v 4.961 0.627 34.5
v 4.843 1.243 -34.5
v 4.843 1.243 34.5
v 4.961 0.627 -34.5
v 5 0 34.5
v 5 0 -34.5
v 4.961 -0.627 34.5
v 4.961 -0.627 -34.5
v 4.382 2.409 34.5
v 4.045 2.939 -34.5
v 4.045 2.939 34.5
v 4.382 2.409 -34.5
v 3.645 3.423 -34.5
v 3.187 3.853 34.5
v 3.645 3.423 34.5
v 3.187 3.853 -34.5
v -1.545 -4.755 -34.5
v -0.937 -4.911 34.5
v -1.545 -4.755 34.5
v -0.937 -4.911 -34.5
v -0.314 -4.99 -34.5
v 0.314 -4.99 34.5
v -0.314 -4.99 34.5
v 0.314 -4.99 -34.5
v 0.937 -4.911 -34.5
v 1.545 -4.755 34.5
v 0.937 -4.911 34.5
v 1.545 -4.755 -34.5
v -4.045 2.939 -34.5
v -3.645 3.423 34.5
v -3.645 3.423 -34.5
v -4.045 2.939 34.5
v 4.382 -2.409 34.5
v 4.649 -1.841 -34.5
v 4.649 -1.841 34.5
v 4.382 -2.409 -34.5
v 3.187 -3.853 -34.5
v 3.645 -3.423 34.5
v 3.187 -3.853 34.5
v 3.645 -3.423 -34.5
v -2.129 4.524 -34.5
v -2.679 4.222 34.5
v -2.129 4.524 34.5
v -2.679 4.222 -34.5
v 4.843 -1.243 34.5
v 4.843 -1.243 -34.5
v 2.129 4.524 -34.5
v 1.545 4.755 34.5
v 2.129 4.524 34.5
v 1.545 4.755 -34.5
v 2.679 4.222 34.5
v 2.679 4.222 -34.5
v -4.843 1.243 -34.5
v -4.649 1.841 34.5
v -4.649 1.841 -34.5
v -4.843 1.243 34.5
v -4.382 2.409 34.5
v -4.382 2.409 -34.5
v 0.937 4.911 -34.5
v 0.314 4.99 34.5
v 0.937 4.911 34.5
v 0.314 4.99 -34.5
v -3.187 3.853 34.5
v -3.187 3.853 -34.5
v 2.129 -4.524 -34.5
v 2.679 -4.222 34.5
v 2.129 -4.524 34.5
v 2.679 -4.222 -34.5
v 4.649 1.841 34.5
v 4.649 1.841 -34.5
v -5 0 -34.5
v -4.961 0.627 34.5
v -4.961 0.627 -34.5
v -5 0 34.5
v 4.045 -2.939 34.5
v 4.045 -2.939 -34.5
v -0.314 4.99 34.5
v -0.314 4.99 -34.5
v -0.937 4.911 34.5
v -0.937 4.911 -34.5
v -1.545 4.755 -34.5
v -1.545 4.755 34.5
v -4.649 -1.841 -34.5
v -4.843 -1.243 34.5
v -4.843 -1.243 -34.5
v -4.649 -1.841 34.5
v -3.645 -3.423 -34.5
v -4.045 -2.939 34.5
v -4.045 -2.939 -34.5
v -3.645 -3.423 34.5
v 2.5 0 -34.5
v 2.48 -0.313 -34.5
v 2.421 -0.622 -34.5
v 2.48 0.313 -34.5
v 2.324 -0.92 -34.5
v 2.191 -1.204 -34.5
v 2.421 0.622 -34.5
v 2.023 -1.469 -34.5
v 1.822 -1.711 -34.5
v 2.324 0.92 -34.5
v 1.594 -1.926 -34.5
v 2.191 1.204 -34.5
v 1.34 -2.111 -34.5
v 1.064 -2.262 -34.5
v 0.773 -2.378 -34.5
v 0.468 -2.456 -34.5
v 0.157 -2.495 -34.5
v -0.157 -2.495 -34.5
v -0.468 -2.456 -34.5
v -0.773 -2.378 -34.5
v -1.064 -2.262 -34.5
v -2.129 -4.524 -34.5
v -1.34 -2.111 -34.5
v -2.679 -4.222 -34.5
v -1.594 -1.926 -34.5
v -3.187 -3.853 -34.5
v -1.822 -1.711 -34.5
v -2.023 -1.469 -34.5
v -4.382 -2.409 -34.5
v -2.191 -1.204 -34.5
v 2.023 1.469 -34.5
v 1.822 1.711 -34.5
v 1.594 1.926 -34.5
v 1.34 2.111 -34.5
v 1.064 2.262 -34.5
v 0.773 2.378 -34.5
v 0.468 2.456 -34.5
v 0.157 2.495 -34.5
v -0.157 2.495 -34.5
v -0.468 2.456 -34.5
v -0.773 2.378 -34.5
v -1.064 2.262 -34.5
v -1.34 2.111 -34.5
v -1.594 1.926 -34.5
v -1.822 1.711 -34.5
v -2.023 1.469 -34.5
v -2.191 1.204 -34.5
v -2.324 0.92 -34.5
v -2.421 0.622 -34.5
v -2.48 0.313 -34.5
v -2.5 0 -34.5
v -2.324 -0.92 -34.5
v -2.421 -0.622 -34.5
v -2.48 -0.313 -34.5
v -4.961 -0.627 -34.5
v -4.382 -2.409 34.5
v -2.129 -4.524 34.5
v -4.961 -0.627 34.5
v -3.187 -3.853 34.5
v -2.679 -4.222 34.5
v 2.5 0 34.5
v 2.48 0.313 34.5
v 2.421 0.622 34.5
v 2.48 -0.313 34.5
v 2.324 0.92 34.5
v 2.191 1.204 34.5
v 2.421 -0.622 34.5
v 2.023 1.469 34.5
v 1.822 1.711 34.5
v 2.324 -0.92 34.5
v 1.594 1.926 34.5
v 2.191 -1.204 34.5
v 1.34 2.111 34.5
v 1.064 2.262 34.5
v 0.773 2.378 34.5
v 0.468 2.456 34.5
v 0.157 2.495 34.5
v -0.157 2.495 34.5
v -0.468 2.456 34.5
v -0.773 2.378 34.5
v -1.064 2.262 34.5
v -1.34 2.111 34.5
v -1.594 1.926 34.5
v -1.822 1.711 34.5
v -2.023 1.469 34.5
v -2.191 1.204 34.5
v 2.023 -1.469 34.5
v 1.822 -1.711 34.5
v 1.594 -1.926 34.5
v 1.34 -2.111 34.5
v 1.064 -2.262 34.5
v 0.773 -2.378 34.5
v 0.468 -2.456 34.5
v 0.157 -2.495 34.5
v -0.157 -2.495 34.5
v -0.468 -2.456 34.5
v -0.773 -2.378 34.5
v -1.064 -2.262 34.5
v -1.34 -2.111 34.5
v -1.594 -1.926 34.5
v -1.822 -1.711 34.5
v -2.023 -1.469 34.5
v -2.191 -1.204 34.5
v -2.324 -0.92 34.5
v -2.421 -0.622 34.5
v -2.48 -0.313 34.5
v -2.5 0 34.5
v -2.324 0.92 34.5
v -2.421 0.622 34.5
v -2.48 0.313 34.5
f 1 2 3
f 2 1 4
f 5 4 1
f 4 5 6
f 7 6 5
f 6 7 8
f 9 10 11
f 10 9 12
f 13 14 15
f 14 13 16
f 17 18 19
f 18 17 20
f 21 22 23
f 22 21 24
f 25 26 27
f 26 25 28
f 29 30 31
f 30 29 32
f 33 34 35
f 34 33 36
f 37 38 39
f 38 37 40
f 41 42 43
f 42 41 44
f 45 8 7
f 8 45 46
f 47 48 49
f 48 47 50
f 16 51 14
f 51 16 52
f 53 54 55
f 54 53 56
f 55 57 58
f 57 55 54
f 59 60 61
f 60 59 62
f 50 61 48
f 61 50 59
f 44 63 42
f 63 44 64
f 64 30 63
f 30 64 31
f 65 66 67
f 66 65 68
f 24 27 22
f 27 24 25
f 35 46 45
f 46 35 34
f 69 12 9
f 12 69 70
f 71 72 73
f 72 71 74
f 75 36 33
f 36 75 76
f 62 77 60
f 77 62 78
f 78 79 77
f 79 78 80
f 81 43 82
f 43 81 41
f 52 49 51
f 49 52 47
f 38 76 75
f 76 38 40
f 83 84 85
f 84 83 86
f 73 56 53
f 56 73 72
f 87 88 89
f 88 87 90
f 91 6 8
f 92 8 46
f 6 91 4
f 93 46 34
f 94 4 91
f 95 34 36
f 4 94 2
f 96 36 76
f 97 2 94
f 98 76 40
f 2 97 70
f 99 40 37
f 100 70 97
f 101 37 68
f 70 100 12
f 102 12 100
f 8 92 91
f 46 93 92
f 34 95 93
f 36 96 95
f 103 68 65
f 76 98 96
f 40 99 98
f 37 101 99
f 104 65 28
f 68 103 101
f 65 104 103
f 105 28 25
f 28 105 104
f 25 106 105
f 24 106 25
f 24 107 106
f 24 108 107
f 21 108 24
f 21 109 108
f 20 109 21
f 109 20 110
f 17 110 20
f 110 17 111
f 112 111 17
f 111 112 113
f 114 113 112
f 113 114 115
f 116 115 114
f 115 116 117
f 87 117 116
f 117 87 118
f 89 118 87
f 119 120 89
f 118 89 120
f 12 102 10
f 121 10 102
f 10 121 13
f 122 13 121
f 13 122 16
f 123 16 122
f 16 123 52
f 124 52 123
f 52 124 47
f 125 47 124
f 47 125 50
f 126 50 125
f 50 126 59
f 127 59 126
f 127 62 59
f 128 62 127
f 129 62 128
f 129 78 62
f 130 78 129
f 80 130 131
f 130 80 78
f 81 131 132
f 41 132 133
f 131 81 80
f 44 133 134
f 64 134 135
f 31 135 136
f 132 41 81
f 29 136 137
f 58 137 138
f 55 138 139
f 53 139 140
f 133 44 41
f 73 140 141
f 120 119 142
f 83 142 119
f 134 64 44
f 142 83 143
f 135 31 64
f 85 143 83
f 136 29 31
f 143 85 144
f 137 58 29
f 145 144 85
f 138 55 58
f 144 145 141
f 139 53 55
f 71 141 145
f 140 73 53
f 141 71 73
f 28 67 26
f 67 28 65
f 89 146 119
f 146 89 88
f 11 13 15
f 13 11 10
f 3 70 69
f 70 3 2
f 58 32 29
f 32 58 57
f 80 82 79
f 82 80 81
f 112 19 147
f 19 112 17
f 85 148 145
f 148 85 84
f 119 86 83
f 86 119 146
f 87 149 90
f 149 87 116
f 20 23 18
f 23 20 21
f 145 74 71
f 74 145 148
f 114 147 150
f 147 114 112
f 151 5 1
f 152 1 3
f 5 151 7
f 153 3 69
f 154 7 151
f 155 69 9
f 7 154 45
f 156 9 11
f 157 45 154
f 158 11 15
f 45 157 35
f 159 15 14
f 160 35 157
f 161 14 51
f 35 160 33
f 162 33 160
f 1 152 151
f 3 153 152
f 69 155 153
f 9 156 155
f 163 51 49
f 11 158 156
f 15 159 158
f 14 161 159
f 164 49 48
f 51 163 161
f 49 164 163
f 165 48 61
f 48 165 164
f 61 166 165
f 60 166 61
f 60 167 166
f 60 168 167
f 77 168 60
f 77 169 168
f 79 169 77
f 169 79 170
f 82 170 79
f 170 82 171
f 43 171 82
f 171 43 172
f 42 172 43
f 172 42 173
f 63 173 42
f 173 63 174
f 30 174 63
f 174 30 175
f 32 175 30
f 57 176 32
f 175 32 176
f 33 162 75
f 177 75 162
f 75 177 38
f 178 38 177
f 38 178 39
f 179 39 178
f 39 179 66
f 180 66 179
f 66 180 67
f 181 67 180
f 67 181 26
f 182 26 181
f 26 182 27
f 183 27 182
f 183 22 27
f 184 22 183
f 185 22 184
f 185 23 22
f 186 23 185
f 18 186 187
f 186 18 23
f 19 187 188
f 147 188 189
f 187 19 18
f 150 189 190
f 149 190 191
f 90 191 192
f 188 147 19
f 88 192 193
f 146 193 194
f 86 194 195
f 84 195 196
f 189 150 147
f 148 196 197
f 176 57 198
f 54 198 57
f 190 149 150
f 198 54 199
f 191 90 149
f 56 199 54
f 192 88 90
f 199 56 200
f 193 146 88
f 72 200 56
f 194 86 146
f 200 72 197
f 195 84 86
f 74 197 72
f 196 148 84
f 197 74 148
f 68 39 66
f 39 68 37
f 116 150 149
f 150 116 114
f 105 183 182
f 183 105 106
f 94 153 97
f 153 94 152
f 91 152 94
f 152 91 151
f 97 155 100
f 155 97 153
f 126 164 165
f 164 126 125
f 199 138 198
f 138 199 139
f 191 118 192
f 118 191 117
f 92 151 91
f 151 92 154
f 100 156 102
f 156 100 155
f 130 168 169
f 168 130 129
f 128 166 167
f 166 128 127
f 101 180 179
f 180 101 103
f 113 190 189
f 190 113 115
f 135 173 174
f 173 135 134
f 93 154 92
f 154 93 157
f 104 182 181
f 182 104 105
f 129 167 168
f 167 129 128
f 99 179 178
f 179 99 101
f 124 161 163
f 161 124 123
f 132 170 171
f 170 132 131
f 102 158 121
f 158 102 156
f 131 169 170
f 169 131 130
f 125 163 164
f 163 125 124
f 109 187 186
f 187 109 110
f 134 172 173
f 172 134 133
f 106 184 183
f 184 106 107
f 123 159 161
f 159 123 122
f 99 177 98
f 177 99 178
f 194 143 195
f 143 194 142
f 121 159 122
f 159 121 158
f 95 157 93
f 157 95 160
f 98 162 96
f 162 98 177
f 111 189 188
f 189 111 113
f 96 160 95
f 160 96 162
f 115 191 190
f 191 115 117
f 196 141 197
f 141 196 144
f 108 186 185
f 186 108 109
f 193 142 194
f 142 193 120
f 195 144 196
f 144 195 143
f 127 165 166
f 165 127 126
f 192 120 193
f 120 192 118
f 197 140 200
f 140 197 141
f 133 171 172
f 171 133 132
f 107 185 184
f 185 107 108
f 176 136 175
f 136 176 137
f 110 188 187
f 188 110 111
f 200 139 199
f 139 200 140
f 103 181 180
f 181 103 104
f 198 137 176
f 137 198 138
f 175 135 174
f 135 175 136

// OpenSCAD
$fn = 50;


difference() {
	union() {
		translate(v = [0, 0, -34.5000000000]) {
			cylinder(h = 69, r = 5.0000000000);
		}
	}
	union() {
		translate(v = [0, 0, -100.0000000000]) {
			cylinder(h = 200, r = 2.5000000000);
		}
	}
}
